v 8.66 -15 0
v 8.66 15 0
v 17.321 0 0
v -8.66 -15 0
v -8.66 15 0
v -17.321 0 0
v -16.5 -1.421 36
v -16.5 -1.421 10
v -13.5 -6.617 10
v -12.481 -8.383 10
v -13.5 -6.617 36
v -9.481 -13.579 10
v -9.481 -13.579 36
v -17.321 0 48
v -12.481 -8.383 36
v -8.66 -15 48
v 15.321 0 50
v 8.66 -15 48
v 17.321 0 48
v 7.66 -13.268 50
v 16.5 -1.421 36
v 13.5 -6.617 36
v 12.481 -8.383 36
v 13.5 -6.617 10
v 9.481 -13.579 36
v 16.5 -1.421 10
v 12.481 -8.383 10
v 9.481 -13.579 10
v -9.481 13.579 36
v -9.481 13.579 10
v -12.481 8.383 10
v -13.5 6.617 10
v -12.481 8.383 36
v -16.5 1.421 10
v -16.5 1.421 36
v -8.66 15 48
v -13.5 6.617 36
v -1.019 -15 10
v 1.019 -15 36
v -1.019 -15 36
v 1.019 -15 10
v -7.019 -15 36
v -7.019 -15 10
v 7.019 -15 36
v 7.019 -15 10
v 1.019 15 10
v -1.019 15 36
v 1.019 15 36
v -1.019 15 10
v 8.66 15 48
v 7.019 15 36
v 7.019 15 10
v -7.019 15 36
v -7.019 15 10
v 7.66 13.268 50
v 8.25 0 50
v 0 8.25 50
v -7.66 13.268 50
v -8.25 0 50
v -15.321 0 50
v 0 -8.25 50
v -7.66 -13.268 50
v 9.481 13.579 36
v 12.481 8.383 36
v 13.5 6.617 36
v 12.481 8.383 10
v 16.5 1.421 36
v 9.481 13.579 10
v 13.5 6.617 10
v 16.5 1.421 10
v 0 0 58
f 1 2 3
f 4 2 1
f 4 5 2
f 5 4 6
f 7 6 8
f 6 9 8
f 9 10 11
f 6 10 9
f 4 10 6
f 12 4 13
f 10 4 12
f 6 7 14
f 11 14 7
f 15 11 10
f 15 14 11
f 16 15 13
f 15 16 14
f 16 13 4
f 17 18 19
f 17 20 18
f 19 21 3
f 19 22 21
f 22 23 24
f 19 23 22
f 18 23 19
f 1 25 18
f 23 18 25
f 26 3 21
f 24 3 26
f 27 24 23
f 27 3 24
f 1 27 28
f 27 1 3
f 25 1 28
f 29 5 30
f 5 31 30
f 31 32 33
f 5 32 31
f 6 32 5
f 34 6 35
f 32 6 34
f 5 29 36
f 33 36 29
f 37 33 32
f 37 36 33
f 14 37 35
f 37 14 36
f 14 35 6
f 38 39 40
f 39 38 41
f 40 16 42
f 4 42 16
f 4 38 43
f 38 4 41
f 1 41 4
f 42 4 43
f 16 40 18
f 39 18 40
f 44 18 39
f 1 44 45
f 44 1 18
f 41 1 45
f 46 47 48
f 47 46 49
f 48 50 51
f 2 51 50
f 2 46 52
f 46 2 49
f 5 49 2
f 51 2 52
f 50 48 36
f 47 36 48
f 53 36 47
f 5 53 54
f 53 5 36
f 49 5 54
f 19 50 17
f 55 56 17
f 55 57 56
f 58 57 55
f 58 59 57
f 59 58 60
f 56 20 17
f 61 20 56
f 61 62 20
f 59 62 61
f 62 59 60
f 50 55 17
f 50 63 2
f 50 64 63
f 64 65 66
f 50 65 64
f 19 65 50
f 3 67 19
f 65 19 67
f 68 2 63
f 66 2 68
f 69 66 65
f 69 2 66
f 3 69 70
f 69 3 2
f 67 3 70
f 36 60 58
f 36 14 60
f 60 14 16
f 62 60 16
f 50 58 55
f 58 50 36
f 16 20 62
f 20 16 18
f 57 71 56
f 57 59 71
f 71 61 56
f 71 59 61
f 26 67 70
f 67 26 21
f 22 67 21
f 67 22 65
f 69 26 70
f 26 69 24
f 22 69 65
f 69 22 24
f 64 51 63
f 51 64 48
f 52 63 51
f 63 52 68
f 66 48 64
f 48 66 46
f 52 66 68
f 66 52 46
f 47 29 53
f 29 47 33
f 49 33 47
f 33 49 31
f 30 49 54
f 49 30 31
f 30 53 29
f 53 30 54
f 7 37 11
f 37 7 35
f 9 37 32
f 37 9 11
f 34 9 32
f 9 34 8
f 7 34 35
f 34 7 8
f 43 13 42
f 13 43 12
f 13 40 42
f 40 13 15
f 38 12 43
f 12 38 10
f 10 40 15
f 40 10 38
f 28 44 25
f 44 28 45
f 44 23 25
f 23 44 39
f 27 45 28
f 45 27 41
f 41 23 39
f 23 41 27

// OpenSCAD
// Gold reference: a sci-fi HARD-SURFACE desk token — a hexagonal pillar (across-flats 30mm,
// 50mm tall) with a 2mm/45-deg chamfer around the top edge, a shallow recessed rectangular panel
// on each of the six faces, and a low-poly faceted (4-sided) pyramidal finial on top. Exercises
// the hard-surface vocabulary the prompt teaches — chamfered edges + recessed panel lines + a
// faceted accent — NOT a smooth blob. Single manifold solid, flat on z=0.
$fn = 96;

af = 30;             // across-flats of the hex
od = af / cos(30);   // circum-diameter for cylinder($fn=6) so the flats sit at af/2
h = 50;              // pillar height
cham = 2;            // top-edge chamfer (45 deg)
panel_w = 14;        // recessed panel width (around the face)
panel_h = 26;        // recessed panel height (up the face)
panel_d = 1.5;       // panel recess depth
fin_h = 8;           // faceted finial height

module hexcol(d, height) cylinder(d = d, h = height, $fn = 6);

module pillar() {
  // chamfered top edge: hull the full hex (up to h-cham) with a shrunken hex slice at the top
  hull() {
    hexcol(od, h - cham);
    translate([0, 0, h - cham]) hexcol(od - 2 * cham, cham);
  }
}

module recessed_panels() {
  for (i = [0:5])
    rotate([0, 0, 60 * i])              // a flat face faces +X at i=0 for an $fn=6 cylinder
      translate([af / 2, 0, h * 0.46])  // box centred on the face plane → carves panel_d inward
        cube([2 * panel_d, panel_w, panel_h], center = true);
}

module finial() {
  // low-poly pyramidal finial (4 facets) — the deliberate faceted accent
  translate([0, 0, h]) cylinder(d1 = af * 0.55, d2 = 0, h = fin_h, $fn = 4);
}

difference() {
  union() {
    pillar();
    finial();
  }
  recessed_panels();
}
